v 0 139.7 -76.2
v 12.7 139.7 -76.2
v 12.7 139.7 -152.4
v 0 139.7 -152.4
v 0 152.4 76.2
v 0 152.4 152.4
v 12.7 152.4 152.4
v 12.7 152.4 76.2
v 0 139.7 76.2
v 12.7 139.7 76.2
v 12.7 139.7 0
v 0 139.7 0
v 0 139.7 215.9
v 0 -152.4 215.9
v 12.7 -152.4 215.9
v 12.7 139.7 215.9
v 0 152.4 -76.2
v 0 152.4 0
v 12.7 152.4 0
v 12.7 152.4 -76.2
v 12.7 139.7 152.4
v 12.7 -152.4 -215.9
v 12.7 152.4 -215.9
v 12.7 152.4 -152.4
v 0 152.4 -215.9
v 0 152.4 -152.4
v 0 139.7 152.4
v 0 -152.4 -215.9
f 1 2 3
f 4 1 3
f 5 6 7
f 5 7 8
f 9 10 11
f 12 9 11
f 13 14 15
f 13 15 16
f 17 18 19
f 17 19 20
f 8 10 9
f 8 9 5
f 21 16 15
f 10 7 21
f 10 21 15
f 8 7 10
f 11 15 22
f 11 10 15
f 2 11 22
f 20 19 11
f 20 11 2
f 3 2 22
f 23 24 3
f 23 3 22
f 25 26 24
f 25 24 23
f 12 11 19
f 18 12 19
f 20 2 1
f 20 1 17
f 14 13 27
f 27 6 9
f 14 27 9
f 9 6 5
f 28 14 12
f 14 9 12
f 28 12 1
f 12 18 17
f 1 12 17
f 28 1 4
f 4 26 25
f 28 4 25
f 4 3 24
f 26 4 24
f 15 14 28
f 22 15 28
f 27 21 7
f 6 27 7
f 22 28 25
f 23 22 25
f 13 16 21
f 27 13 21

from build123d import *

# Parameters (mm, degrees)
SKETCH1_W           = 431.8
SKETCH1_H           = 304.8
BOSS_EXTRUDE1_DEPTH = 12.7
SKETCH2_W           = 63.5
SKETCH2_H           = 12.7
SKETCH2_W_2         = 76.2
CUT_EXTRUDE1_DEPTH  = 265.574866531


with BuildPart() as part:
    # Sketch1 → Boss-Extrude1 (new body)
    with BuildSketch(Plane(origin=(0, 0, 0), x_dir=(0, 0, -1), z_dir=(1, 0, 0))):
        Rectangle(SKETCH1_W, SKETCH1_H)
    extrude(amount=BOSS_EXTRUDE1_DEPTH)

    # Sketch2 → Cut-Extrude1 (cut, through all)
    with BuildSketch(Plane(origin=(12.7, 0, 0), x_dir=(0, 0, -1), z_dir=(1, 0, 0))):
        with Locations((-184.15, 146.05)):
            Rectangle(SKETCH2_W, SKETCH2_H)
        with Locations((-38.1, 146.05)):
            Rectangle(SKETCH2_W_2, SKETCH2_H)
        with Locations((114.3, 146.05)):
            Rectangle(SKETCH2_W_2, SKETCH2_H)
    extrude(amount=-CUT_EXTRUDE1_DEPTH, mode=Mode.SUBTRACT)


solid = part.part
